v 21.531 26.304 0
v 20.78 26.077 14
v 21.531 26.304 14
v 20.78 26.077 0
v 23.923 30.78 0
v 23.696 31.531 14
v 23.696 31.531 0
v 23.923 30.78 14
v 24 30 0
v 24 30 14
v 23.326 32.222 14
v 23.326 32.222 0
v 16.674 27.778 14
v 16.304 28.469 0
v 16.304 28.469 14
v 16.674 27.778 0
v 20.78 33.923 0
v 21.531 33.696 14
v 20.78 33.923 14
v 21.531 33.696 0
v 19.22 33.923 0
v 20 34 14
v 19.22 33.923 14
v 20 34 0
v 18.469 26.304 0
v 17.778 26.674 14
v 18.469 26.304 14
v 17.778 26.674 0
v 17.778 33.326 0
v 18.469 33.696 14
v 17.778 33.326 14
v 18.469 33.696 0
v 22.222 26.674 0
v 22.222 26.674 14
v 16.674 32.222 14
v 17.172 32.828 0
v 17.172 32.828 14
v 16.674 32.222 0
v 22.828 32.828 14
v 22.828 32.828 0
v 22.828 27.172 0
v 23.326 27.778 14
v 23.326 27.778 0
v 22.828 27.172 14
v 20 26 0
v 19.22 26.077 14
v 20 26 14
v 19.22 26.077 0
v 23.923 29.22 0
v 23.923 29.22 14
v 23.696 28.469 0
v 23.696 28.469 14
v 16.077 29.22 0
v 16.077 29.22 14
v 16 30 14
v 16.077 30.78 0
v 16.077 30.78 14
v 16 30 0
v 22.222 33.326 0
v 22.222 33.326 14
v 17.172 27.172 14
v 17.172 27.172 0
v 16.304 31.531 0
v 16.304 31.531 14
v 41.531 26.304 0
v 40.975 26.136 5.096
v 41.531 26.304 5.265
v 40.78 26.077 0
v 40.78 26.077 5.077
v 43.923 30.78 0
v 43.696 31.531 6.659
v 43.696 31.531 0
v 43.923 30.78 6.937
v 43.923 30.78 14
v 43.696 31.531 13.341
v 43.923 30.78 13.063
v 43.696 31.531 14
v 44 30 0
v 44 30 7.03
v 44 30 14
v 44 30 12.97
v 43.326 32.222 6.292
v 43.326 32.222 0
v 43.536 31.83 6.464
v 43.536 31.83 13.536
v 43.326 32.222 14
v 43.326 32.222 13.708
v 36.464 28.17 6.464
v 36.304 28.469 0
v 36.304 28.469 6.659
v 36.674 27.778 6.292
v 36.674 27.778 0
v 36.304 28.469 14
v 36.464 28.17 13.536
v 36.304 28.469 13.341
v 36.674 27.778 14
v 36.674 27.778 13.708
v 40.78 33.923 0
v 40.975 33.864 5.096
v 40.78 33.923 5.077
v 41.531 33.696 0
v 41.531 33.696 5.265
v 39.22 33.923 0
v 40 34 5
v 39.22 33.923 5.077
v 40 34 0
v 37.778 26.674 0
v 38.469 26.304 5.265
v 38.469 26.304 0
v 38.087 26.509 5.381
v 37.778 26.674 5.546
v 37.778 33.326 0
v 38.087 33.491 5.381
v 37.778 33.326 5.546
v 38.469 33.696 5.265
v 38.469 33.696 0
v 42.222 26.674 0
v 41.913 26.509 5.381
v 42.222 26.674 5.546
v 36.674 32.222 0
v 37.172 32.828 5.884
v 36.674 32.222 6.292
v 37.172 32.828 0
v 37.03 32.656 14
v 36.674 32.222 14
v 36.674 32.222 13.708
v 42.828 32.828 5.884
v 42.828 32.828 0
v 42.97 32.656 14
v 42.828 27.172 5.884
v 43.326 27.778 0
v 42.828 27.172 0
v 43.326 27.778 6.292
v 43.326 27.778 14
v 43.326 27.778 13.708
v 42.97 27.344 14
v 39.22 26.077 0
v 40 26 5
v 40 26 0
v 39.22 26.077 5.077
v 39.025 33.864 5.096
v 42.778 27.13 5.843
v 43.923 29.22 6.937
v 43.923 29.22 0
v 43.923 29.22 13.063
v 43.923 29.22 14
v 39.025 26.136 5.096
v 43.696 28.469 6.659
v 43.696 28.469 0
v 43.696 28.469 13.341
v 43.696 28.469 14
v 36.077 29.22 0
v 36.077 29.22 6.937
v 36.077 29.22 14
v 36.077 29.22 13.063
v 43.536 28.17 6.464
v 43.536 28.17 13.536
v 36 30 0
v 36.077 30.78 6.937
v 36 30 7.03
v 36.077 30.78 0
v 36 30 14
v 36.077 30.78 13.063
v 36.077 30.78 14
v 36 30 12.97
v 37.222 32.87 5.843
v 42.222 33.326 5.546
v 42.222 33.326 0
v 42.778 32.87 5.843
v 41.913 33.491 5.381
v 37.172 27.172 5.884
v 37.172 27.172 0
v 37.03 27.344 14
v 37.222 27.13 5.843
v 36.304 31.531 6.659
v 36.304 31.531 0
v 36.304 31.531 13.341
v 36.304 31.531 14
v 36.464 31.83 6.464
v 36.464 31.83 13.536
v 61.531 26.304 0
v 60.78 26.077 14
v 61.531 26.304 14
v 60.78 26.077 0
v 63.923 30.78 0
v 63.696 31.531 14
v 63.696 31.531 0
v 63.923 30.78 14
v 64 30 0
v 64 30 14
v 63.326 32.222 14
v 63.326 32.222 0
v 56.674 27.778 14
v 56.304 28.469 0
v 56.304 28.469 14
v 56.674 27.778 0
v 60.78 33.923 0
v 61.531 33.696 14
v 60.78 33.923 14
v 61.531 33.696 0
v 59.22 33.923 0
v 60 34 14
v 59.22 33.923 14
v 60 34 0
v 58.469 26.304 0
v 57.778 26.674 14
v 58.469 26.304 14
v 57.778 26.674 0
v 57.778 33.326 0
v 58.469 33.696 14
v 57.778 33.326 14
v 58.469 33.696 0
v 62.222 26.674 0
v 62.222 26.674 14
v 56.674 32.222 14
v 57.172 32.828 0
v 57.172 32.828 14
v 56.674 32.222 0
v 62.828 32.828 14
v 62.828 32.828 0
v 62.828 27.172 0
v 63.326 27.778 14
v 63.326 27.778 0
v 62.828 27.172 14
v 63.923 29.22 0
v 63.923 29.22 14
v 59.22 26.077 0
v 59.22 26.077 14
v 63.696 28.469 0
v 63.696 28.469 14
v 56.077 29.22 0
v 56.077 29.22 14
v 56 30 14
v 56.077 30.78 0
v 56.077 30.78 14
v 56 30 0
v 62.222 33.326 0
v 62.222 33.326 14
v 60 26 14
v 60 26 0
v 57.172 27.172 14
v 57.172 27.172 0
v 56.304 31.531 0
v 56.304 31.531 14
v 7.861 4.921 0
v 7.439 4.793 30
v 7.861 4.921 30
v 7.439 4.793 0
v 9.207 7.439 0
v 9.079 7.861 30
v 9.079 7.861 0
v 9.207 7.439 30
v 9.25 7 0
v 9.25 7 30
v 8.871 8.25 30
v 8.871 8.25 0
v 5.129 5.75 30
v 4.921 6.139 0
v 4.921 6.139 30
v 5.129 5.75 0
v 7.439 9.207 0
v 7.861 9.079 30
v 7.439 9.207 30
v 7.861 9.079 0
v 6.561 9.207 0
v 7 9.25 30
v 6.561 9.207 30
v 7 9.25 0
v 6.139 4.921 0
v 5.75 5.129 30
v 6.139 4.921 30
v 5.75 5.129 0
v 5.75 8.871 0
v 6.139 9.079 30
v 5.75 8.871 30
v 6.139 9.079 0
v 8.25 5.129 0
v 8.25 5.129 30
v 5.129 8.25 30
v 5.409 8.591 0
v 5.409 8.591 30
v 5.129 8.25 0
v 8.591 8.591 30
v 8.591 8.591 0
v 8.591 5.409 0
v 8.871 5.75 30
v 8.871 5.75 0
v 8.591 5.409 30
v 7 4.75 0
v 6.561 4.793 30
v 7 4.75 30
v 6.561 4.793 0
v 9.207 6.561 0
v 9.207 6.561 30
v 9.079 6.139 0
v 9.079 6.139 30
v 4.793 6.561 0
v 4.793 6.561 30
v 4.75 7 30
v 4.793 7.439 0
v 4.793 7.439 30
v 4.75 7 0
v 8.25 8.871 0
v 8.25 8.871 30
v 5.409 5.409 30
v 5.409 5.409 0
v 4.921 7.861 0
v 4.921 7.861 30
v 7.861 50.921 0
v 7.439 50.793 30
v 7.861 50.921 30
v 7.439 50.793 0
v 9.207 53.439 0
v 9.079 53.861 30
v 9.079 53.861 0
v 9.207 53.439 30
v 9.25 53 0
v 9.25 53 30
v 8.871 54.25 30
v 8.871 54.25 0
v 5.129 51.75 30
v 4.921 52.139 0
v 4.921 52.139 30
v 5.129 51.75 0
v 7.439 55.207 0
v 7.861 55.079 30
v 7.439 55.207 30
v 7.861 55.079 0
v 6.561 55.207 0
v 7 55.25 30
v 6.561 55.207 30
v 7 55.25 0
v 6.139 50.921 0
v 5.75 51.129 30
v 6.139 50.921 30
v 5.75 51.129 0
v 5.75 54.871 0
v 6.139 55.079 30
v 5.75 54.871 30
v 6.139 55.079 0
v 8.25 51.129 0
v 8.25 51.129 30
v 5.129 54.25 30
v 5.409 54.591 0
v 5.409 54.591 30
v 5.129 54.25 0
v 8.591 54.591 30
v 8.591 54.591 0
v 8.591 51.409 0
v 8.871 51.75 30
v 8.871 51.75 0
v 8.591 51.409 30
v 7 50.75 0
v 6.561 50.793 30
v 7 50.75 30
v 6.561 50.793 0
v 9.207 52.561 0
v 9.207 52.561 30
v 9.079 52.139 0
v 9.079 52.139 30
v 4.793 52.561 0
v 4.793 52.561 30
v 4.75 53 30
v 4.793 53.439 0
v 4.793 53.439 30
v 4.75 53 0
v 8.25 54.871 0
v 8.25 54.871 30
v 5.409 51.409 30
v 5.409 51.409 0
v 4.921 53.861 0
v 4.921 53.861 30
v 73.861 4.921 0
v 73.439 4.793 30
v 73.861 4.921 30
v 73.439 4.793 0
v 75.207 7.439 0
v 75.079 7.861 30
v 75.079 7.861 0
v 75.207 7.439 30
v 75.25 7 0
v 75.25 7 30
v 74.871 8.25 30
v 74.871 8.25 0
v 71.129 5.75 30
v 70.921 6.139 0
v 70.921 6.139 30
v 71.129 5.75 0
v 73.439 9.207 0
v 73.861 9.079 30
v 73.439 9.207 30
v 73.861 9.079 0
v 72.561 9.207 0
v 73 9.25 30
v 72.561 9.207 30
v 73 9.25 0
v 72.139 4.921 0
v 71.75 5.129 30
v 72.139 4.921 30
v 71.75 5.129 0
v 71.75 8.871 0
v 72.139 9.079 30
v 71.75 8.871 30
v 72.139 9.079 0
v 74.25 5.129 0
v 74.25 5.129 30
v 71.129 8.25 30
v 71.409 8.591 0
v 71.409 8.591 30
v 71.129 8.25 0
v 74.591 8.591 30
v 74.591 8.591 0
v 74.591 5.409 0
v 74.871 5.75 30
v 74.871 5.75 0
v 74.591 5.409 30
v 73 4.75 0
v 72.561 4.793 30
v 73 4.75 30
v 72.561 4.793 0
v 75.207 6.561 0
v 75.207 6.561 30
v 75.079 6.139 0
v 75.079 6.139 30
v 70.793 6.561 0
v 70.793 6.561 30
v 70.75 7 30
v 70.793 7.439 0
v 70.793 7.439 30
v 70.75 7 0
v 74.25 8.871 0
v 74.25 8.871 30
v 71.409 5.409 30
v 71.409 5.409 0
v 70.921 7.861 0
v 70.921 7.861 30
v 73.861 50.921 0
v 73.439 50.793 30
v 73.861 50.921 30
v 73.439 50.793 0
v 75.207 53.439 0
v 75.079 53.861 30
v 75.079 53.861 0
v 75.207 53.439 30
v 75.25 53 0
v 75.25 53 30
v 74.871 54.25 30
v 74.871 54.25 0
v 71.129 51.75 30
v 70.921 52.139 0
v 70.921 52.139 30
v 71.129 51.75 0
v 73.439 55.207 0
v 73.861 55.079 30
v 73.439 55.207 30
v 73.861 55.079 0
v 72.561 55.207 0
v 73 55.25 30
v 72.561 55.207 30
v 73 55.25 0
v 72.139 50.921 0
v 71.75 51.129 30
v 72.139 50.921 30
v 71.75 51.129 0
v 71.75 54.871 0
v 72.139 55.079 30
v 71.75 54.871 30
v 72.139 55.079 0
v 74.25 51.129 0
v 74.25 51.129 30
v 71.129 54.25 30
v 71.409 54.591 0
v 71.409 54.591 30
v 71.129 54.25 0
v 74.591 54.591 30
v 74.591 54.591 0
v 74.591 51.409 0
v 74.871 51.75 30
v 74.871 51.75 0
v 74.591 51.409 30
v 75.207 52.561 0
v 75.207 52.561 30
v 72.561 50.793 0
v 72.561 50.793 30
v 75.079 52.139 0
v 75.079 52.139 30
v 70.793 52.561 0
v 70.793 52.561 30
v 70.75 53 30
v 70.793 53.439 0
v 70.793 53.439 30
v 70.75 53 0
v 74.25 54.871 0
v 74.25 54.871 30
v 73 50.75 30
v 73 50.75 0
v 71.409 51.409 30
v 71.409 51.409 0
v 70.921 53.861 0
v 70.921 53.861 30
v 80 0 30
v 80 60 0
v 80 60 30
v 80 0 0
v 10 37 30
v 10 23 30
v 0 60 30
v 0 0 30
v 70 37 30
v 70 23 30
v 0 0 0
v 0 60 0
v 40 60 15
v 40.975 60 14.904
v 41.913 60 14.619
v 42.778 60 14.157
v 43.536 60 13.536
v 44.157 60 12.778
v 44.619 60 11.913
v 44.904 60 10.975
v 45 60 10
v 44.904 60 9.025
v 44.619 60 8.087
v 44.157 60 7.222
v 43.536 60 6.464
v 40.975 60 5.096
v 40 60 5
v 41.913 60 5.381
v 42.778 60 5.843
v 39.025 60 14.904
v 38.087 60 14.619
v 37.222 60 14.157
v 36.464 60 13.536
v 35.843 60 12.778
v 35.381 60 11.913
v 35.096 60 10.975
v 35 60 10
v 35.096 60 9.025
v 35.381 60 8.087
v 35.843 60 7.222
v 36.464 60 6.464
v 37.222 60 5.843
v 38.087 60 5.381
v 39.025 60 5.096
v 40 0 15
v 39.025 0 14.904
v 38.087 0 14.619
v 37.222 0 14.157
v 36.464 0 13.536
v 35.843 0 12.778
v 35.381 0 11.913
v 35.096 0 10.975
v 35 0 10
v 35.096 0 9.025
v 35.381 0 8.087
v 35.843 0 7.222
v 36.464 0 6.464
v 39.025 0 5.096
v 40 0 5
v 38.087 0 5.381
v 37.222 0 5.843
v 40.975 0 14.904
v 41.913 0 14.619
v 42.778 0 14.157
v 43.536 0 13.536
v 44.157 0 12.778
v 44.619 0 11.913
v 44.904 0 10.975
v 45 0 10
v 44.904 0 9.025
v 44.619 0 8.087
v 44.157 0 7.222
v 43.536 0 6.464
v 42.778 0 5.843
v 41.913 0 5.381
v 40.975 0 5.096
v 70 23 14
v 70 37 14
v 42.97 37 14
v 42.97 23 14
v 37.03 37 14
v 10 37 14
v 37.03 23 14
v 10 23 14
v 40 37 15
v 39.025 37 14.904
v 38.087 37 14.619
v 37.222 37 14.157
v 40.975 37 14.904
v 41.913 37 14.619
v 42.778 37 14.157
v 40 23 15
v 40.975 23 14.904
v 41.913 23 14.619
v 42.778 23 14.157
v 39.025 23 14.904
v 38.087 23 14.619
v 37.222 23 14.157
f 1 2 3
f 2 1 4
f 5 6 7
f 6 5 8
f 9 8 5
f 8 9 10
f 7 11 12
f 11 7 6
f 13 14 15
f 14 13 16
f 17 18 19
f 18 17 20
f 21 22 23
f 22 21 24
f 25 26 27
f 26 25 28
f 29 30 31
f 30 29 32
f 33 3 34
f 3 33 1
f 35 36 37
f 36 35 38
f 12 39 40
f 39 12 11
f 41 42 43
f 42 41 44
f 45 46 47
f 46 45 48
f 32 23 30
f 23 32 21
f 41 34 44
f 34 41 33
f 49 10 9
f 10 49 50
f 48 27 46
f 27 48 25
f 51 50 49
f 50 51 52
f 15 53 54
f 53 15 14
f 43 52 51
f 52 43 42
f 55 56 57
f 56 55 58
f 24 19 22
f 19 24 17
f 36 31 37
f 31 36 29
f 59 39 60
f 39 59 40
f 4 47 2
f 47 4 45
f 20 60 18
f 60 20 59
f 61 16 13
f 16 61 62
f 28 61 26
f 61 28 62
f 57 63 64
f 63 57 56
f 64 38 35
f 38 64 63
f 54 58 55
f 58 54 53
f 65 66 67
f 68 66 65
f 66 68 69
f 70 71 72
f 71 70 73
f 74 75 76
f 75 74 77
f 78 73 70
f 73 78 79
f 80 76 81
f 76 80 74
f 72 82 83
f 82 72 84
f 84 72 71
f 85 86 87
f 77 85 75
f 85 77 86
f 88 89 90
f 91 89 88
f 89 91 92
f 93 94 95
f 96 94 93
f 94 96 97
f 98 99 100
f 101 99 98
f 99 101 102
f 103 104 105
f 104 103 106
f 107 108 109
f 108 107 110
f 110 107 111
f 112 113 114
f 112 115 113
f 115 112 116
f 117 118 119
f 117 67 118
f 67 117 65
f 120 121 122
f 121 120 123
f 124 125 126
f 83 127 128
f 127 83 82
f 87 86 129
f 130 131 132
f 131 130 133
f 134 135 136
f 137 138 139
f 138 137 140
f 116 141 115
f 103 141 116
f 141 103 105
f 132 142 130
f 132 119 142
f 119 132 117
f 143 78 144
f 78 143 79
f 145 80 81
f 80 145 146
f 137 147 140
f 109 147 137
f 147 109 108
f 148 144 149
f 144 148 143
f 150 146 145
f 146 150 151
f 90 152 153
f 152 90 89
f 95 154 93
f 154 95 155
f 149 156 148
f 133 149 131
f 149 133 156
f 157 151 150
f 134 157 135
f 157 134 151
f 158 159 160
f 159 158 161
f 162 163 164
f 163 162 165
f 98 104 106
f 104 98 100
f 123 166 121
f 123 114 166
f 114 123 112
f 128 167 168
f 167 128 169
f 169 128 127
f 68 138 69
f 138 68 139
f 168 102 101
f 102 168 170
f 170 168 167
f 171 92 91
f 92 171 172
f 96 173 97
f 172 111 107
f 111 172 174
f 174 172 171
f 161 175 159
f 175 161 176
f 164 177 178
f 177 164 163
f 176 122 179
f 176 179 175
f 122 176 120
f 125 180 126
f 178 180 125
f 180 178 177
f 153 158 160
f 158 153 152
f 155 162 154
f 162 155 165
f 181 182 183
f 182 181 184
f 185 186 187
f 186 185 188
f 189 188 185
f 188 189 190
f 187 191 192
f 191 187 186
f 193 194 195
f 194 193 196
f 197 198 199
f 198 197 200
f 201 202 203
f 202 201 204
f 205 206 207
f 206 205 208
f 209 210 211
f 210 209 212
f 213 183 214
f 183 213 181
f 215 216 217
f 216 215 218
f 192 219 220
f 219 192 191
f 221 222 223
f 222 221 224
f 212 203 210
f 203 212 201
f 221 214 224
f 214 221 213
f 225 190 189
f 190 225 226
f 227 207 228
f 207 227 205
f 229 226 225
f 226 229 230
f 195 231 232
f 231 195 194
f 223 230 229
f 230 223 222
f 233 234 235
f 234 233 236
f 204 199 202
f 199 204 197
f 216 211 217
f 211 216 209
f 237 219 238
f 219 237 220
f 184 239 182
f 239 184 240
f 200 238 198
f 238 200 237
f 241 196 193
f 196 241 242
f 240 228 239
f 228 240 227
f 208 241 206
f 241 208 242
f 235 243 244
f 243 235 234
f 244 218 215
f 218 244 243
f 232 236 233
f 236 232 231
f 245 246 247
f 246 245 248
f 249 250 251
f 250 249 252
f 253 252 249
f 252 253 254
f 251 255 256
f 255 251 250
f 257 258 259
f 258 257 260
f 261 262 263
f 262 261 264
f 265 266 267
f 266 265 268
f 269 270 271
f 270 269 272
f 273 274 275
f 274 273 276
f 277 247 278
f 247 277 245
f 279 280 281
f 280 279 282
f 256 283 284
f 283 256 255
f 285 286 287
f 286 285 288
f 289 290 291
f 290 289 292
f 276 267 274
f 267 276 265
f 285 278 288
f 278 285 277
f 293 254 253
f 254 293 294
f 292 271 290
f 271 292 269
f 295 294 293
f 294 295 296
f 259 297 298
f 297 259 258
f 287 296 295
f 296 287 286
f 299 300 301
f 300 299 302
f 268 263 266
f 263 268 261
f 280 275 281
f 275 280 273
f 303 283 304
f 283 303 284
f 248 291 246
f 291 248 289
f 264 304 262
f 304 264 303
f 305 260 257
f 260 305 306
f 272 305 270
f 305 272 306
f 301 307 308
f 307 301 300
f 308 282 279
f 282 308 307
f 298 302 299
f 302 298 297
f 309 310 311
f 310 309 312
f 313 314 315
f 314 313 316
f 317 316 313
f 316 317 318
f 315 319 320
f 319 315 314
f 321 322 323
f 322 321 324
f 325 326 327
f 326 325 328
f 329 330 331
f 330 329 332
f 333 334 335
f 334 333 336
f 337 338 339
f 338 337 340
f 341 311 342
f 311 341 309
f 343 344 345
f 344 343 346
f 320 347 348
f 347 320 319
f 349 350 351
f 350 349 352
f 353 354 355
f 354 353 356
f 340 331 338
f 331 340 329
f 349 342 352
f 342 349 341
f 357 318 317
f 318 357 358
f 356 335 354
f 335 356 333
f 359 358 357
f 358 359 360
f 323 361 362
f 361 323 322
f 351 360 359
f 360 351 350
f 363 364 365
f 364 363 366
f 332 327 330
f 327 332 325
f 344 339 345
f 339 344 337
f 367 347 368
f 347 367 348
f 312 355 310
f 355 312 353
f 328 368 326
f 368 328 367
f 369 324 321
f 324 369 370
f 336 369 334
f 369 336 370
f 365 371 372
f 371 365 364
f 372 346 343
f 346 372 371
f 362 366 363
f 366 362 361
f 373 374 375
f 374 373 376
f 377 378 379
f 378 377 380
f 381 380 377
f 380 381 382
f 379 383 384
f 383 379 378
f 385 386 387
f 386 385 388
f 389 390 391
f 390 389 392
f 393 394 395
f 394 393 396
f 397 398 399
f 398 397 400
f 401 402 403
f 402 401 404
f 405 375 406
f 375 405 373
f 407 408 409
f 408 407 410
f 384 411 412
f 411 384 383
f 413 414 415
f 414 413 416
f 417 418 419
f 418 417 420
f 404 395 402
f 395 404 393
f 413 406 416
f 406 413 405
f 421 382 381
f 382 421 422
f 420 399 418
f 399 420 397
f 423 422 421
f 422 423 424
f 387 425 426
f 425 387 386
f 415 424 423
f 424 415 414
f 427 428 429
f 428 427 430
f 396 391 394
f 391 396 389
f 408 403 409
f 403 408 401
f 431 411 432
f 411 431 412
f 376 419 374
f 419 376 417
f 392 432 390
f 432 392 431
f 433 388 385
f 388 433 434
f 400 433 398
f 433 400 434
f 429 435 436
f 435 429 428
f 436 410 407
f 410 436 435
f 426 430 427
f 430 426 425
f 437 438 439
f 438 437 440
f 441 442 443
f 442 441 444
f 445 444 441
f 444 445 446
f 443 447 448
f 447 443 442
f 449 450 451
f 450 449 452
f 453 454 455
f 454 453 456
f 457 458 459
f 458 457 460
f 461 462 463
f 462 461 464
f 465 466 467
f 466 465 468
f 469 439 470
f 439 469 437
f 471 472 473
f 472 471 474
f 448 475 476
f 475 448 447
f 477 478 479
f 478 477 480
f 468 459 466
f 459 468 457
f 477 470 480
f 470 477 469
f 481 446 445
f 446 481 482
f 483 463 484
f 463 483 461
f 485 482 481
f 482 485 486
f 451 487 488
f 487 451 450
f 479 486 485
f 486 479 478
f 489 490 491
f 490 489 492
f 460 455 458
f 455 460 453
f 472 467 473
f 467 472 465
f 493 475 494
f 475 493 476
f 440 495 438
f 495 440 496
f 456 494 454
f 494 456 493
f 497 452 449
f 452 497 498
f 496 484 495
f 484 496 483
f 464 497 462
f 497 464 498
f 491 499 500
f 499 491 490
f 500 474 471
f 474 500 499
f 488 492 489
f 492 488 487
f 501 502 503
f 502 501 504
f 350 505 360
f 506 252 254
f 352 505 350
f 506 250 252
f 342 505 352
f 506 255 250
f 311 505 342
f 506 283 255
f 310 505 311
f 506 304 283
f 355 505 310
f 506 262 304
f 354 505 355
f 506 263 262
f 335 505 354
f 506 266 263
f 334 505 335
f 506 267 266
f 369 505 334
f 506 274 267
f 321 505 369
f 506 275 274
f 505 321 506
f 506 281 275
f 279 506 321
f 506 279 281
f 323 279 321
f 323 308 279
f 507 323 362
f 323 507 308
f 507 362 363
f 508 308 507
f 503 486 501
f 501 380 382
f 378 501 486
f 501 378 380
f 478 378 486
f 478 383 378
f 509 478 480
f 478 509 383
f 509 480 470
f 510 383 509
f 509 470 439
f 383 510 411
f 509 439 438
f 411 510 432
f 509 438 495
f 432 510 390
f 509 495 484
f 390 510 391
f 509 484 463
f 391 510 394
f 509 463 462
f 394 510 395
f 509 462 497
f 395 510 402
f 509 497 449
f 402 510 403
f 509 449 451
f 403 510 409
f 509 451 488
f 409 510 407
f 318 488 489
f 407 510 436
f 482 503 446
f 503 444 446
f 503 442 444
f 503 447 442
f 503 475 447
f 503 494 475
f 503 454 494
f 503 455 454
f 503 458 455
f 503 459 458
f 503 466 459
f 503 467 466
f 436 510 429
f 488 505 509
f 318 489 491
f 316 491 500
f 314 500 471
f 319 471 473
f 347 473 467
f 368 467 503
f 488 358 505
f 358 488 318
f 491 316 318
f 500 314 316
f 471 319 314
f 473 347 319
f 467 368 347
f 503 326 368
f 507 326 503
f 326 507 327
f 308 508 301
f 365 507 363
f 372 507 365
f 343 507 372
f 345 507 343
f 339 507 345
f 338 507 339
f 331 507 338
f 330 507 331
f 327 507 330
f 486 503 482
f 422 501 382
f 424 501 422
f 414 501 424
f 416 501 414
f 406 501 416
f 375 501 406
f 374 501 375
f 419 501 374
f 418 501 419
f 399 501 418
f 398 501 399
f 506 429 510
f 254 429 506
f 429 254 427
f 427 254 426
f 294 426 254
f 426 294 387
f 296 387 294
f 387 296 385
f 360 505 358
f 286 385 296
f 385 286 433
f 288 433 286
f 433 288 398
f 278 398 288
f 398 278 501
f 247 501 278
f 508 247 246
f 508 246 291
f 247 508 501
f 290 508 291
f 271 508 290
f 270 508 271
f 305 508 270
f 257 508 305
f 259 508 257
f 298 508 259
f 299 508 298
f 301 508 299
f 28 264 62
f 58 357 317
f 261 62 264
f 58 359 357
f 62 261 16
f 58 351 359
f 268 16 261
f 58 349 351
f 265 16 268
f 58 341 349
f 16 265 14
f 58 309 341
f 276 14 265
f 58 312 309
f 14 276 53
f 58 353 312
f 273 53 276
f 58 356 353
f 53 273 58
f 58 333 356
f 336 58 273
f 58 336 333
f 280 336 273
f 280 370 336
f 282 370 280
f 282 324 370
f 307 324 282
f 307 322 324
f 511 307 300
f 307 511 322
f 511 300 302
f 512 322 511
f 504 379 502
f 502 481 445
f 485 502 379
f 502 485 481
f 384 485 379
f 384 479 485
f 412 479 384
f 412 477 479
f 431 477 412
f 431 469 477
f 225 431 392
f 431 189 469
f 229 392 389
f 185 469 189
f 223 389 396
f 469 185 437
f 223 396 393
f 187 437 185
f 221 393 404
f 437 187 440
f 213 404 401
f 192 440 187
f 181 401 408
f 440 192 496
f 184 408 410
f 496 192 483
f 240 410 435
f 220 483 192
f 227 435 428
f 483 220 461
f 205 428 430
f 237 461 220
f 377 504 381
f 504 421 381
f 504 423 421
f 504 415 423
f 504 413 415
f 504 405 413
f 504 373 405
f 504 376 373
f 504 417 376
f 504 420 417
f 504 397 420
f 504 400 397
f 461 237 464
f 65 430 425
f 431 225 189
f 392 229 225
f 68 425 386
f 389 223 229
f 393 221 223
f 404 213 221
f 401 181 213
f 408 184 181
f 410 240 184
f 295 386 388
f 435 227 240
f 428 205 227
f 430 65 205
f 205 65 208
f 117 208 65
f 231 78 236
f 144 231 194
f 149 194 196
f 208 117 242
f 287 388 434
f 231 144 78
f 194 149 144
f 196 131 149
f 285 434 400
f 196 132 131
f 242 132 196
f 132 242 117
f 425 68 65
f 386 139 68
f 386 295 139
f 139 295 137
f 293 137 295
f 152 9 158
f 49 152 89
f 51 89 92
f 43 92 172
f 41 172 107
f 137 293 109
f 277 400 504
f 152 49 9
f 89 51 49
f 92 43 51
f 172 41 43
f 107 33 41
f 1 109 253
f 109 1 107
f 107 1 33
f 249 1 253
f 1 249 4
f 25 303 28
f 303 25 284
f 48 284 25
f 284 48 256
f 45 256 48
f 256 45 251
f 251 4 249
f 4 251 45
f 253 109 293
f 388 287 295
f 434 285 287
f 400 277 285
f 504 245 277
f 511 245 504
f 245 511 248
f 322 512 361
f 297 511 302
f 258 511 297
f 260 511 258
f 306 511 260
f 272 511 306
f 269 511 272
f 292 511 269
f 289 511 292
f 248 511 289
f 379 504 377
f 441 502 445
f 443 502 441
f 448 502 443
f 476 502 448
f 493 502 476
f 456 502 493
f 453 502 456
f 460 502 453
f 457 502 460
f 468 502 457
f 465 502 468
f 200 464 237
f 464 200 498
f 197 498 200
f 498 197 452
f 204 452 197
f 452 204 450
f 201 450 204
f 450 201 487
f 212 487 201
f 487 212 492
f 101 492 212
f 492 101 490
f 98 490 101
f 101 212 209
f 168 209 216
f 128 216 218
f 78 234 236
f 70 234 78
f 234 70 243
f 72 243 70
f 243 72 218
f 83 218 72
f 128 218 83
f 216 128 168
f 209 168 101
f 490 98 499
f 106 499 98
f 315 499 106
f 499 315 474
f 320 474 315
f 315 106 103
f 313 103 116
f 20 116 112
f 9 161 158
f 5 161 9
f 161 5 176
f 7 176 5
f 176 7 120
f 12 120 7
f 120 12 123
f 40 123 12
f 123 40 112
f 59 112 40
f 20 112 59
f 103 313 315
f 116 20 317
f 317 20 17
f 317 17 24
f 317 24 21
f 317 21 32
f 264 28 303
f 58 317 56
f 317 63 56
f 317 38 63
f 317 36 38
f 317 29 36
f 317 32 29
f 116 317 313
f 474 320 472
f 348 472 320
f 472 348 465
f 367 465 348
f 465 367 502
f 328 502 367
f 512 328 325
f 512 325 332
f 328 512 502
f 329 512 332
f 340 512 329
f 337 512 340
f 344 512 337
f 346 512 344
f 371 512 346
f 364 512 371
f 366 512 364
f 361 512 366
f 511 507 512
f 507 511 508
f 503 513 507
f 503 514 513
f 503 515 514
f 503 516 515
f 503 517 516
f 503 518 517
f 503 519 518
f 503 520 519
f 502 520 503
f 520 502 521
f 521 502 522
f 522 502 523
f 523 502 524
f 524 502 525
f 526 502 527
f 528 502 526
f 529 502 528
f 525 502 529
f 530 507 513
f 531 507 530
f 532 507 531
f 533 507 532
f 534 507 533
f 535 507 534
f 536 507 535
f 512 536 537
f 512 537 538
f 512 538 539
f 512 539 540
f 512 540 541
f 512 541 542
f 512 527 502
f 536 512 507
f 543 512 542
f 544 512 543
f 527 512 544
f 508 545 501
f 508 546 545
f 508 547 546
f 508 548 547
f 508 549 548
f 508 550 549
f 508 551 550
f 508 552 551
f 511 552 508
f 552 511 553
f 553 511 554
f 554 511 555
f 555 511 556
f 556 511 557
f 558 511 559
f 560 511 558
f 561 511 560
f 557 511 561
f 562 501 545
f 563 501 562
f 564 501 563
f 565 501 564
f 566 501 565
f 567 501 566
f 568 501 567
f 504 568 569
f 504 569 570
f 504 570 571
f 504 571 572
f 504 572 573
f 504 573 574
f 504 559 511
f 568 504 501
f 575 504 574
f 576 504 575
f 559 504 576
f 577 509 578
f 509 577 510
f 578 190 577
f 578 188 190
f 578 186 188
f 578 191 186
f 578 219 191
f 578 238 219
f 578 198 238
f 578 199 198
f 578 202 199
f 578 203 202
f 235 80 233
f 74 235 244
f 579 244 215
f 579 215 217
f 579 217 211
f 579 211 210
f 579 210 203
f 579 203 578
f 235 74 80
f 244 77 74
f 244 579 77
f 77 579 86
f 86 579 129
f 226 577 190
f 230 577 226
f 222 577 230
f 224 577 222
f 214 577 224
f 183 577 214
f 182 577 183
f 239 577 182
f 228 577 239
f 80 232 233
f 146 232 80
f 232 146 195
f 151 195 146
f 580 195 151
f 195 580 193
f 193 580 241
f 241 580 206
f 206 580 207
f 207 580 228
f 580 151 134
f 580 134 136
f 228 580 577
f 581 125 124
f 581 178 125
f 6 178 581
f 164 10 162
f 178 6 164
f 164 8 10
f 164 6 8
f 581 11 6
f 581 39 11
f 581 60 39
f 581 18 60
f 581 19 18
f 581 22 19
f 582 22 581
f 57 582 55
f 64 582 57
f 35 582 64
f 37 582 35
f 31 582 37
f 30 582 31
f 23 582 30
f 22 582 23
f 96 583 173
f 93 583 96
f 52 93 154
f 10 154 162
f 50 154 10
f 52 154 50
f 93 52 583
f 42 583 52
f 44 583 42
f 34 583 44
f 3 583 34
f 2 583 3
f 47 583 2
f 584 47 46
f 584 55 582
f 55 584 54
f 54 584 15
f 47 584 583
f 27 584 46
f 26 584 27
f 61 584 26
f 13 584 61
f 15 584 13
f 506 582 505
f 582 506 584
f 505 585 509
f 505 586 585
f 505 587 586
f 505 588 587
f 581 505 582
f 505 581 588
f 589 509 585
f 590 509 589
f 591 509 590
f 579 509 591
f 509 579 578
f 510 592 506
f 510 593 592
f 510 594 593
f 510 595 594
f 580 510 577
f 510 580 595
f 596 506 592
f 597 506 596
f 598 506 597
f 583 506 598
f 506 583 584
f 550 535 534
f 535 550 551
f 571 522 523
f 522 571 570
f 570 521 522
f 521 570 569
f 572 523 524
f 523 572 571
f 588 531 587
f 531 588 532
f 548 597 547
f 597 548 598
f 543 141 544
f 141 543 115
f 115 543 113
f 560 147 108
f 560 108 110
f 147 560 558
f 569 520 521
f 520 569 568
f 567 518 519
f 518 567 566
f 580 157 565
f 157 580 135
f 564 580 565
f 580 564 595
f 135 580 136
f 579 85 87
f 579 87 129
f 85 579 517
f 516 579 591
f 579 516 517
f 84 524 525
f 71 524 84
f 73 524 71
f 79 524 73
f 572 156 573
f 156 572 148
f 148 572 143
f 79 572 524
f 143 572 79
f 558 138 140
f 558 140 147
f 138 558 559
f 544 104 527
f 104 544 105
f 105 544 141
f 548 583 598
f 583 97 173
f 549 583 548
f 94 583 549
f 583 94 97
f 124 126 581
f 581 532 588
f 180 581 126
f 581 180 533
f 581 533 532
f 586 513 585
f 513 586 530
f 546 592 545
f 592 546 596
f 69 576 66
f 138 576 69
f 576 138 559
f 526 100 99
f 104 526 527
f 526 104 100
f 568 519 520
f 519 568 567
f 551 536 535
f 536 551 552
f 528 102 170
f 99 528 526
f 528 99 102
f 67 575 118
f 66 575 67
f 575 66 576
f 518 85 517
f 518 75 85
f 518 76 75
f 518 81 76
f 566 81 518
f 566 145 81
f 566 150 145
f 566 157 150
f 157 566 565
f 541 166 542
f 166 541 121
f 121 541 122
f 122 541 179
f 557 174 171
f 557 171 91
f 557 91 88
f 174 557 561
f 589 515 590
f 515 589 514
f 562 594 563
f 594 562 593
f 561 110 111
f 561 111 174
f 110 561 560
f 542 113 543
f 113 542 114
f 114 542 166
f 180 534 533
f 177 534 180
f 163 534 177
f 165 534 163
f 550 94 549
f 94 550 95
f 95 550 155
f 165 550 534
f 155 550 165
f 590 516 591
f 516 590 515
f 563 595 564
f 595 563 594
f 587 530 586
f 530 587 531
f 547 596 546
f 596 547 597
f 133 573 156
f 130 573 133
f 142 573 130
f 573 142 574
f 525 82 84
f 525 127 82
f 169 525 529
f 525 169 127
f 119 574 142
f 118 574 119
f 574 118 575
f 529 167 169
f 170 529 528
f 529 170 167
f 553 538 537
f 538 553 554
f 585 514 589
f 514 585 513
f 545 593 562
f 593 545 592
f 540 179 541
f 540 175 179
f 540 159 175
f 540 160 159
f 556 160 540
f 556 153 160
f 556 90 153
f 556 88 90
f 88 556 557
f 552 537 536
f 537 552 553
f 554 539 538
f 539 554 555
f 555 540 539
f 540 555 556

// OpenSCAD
$fn = 32;

// ----------------------------------------------------------------------
// Manifold block: side_outlet manifold
// ----------------------------------------------------------------------

// --- parameters (mm) ---
block_l = 80;             // block length, X
block_w = 60;             // block width, Y
block_h = 30;             // block height, Z
port_d = 8;               // port bore diameter
port_pitch = 20;          // port pitch along X
gallery_d = 14;           // top gallery width, Y
gallery_depth = 16;       // gallery pocket depth
wall_p = 10;              // gallery end wall thickness, X
mnt_d = 4.5;              // mounting hole diameter
mnt_in = 7;               // mounting hole inset from the edges
out_d = 10;               // outlet bore diameter
out_z = 10;               // outlet axis height

n_ports = 3;  // ports in the row
port_x0 = (block_l - (n_ports - 1) * port_pitch) / 2;  // first port X

difference() {
  cube([block_l, block_w, block_h]);
  for (i = [0 : n_ports - 1])
    translate([port_x0 + i * port_pitch, block_w / 2, -1])
      cylinder(h = block_h + 2, d = port_d);
  translate([wall_p, block_w / 2 - gallery_d / 2, block_h - gallery_depth])
    cube([block_l - 2 * wall_p, gallery_d, gallery_depth + 1]);
  for (cx = [mnt_in, block_l - mnt_in])
    for (cy = [mnt_in, block_w - mnt_in])
      translate([cx, cy, -1]) cylinder(h = block_h + 2, d = mnt_d);
  translate([block_l / 2, -1, out_z]) rotate([-90, 0, 0])
    cylinder(h = block_w + 2, d = out_d);
}
